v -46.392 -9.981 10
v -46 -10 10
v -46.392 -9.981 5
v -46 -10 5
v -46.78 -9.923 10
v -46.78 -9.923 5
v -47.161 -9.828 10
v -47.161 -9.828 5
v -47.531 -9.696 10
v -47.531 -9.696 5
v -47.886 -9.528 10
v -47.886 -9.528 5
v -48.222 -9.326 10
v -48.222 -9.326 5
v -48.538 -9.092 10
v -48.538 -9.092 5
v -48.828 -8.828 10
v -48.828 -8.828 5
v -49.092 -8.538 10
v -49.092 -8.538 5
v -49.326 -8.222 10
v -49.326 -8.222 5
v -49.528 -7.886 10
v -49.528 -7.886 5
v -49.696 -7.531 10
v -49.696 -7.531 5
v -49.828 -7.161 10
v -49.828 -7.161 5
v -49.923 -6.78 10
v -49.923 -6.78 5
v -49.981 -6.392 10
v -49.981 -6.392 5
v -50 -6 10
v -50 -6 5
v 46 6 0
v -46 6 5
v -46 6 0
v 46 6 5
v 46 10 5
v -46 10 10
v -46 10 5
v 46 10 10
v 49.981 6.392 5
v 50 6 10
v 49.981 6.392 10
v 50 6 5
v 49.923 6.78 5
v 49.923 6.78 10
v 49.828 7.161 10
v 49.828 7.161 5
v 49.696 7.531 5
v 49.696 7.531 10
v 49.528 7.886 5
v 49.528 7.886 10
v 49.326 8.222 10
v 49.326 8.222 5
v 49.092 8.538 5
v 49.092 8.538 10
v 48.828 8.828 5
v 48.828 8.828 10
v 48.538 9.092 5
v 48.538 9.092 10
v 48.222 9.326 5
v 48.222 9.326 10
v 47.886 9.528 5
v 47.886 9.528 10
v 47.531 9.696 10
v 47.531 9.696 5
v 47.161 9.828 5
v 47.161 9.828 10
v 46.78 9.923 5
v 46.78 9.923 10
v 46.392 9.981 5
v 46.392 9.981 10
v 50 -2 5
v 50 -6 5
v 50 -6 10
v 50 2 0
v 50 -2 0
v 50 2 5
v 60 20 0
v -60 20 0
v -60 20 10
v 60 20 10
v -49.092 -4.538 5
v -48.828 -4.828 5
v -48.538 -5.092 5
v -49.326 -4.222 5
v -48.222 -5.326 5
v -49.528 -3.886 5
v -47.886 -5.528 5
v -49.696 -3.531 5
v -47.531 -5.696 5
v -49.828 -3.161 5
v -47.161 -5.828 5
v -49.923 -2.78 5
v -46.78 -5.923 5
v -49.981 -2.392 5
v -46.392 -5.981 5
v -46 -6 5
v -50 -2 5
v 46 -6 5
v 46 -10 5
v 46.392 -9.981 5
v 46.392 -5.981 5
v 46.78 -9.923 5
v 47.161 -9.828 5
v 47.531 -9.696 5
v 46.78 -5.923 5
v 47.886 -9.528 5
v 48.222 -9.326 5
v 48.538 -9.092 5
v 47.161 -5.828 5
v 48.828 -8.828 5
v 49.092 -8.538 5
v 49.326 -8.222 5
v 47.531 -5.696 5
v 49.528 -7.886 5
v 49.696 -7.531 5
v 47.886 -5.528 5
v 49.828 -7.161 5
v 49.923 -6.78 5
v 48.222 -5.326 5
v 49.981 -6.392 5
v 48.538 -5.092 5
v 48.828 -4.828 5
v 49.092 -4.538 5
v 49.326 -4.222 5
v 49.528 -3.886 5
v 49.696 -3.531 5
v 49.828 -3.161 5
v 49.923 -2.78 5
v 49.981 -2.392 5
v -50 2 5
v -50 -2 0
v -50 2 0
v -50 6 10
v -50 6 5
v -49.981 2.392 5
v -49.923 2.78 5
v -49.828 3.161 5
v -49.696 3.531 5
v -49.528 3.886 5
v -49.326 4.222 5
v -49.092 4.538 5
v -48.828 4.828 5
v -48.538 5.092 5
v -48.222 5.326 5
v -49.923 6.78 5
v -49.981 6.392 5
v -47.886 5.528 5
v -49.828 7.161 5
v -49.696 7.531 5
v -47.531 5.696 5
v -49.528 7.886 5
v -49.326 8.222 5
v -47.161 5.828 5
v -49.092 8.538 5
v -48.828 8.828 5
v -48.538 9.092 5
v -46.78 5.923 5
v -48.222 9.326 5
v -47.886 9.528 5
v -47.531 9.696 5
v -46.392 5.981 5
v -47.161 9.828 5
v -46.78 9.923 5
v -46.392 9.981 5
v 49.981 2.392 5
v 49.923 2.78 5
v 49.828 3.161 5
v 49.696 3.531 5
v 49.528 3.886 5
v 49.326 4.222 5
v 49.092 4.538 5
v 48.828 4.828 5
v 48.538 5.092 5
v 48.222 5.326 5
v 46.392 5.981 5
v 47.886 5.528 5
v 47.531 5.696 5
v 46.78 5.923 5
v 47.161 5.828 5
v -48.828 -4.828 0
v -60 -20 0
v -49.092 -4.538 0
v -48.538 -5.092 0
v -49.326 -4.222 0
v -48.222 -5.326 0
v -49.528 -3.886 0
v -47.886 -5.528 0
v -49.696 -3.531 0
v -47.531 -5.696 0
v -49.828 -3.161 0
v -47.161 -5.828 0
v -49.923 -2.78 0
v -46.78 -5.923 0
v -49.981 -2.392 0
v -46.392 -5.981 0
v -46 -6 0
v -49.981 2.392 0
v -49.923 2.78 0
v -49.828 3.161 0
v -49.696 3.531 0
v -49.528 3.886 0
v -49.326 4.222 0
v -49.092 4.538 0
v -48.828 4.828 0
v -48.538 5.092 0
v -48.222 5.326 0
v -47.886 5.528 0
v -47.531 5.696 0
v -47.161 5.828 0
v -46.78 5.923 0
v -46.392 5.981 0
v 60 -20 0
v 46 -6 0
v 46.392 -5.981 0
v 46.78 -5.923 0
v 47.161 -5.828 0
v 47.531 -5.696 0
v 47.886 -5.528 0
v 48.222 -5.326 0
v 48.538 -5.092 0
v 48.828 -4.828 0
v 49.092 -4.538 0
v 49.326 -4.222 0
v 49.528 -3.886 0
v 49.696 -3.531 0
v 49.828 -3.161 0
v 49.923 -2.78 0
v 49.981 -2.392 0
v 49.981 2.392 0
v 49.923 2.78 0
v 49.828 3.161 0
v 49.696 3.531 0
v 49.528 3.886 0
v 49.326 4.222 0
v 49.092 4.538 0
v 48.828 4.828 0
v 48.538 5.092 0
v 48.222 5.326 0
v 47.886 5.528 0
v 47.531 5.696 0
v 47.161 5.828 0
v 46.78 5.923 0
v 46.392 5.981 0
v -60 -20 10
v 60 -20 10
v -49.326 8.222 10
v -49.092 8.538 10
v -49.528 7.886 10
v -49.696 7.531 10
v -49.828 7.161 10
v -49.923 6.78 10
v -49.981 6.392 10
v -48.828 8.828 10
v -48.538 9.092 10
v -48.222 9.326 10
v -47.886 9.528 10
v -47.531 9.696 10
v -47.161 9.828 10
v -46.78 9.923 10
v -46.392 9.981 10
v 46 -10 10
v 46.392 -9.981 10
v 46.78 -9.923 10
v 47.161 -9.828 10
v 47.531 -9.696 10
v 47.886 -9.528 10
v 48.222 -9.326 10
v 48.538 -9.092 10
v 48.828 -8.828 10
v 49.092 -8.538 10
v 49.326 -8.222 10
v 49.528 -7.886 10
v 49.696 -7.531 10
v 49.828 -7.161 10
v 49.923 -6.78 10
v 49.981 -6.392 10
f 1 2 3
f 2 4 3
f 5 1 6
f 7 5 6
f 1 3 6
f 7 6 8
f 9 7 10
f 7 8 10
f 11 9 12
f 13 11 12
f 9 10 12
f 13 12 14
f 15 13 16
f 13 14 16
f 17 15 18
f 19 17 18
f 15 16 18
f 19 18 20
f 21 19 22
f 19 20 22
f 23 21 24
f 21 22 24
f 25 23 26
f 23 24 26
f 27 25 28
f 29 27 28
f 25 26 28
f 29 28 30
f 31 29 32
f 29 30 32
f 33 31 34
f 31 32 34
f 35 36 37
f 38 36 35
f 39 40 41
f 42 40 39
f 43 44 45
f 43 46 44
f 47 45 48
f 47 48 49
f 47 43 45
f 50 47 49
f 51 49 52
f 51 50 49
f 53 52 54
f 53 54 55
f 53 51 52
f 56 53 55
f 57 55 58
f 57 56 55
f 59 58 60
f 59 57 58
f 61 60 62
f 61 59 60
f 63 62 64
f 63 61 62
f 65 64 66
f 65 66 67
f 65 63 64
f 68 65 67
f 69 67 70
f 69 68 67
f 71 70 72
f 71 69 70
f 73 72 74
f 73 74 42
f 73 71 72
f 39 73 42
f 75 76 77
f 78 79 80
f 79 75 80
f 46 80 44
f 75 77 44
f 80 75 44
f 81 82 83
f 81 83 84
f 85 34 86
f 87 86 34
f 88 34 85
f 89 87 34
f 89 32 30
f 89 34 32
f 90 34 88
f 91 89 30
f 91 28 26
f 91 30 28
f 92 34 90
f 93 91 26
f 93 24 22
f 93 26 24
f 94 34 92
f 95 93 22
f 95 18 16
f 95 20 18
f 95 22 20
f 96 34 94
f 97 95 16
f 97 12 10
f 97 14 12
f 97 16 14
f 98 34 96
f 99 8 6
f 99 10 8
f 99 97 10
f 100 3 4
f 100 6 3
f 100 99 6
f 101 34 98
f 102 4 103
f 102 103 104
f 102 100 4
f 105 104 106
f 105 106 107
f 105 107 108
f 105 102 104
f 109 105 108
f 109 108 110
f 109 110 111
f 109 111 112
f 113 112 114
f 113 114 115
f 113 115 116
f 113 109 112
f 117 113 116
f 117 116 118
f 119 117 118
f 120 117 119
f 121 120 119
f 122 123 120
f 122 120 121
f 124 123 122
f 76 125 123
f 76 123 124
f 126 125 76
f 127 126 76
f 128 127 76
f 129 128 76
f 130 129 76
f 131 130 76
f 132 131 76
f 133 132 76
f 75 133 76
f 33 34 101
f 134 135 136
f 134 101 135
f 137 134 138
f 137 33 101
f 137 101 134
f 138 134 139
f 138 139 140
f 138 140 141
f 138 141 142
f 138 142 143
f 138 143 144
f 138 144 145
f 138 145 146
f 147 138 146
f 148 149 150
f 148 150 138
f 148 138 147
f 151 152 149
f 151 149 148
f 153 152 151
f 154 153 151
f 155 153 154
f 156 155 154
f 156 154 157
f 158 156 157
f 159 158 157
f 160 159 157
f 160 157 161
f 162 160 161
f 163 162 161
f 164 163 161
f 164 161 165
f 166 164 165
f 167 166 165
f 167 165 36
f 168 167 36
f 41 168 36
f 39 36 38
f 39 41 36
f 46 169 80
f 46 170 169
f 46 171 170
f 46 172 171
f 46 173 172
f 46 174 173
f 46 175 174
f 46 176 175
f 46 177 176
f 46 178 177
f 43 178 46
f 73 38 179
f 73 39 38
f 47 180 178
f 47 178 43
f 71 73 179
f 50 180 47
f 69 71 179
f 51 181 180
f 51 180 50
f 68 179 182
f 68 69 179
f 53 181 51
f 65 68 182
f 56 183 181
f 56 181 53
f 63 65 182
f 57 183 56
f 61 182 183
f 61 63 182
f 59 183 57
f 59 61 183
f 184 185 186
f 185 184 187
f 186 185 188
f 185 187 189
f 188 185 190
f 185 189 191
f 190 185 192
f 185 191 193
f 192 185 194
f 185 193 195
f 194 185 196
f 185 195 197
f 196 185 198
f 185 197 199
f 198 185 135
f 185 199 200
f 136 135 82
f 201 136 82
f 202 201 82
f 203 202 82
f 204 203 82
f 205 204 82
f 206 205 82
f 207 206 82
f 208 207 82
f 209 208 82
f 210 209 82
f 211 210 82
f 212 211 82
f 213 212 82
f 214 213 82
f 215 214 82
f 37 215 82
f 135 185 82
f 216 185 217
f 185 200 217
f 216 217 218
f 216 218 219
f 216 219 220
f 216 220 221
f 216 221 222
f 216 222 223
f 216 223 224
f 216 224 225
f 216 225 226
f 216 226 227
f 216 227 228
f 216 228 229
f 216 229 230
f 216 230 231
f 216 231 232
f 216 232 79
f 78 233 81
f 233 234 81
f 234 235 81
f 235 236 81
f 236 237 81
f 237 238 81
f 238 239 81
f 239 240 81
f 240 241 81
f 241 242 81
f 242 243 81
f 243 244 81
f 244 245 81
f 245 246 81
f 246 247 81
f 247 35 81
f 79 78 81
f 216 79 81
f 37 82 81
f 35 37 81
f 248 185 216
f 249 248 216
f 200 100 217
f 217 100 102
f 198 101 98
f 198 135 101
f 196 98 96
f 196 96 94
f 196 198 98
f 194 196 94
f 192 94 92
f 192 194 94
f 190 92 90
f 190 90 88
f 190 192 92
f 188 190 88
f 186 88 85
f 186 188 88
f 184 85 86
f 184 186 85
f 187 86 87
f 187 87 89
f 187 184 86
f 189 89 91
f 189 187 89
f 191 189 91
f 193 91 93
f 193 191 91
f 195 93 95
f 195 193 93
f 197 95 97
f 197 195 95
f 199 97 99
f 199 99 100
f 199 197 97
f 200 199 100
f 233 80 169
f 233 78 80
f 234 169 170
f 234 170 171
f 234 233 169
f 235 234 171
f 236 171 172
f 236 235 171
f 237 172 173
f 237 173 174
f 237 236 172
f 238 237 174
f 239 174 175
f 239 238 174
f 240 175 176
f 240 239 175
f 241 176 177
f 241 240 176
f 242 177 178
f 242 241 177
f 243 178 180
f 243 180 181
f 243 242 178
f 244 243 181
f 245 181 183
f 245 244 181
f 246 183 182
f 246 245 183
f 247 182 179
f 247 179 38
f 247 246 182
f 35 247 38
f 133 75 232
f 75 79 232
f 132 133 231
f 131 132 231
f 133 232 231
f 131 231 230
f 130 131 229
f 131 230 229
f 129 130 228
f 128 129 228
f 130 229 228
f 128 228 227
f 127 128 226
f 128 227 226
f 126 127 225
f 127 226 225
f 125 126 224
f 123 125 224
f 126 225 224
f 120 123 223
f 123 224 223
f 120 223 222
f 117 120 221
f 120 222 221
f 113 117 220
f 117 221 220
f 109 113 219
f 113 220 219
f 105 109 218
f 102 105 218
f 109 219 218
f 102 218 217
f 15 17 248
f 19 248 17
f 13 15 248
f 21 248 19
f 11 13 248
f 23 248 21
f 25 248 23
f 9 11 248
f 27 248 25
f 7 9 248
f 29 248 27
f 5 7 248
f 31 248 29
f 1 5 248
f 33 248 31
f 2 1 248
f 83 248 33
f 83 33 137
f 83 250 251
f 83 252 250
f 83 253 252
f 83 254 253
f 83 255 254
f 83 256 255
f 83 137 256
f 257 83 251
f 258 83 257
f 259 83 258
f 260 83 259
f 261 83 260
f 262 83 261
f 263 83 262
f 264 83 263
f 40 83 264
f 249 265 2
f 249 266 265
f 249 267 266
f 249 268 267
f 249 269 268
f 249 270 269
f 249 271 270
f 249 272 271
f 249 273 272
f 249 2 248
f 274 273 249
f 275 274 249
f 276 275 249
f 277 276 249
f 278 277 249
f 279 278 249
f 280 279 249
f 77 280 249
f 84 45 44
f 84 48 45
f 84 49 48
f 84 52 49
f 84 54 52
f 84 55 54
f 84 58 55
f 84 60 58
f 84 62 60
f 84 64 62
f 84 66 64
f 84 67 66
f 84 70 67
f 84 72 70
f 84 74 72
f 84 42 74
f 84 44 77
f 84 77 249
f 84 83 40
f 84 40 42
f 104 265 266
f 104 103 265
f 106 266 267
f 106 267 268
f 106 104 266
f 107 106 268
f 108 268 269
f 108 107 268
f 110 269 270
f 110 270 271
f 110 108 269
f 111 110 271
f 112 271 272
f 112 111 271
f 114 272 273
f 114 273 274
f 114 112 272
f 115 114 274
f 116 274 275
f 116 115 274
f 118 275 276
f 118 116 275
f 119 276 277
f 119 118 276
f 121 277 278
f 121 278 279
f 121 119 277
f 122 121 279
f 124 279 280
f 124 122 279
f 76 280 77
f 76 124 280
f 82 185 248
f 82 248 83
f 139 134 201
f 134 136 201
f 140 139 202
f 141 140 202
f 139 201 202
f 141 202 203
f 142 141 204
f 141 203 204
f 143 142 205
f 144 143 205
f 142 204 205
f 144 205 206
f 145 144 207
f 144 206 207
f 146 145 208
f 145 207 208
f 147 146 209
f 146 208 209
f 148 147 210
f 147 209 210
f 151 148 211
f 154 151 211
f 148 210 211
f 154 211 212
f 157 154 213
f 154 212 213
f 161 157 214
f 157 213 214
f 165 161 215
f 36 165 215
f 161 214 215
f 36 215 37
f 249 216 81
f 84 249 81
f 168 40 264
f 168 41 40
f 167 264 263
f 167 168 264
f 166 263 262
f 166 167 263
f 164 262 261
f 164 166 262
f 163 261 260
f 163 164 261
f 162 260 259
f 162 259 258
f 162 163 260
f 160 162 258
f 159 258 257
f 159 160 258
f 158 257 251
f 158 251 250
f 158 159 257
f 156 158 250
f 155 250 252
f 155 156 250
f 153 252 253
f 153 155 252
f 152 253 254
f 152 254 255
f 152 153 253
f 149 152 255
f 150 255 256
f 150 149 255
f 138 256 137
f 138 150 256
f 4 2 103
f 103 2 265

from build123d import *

# Parameters (mm, degrees)
F0_W     = 120
F0_H     = 40
F1_DEPTH = 10
F2_W     = 100
F2_H     = 20
F3_DEPTH = 5
F4_R     = 4
F5_W     = 100
F5_H     = 12
F6_DEPTH = 5
F7_R     = 4


with BuildPart() as f1:
    # F0 (on Top) → F1 (new body)
    with BuildSketch(Plane.XY):
        Rectangle(F0_W, F0_H)
    extrude(amount=F1_DEPTH)

    # F2 (on face) → F3 (cut)
    with BuildSketch(Plane.XY.offset(10)):
        Rectangle(F2_W, F2_H)
    extrude(amount=-F3_DEPTH, mode=Mode.SUBTRACT)

    # F4
    f4_edges = [f1.edges().sort_by_distance(p)[0] for p in [
        (-50, 10, 7.5),
        (50, 10, 7.5),
        (50, -10, 7.5),
        (-50, -10, 7.5),
    ]]
    fillet(f4_edges, radius=F4_R)

    # F5 (on face) → F6 (cut, through all)
    with BuildSketch(Plane.XY.offset(5)):
        Rectangle(F5_W, F5_H)
    extrude(amount=-F6_DEPTH, mode=Mode.SUBTRACT)

    # F7
    f7_edges = [f1.edges().sort_by_distance(p)[0] for p in [
        (-50, 6, 2.5),
        (-50, -6, 2.5),
        (50, -6, 2.5),
        (50, 6, 2.5),
    ]]
    fillet(f7_edges, radius=F7_R)


solid = f1.part
